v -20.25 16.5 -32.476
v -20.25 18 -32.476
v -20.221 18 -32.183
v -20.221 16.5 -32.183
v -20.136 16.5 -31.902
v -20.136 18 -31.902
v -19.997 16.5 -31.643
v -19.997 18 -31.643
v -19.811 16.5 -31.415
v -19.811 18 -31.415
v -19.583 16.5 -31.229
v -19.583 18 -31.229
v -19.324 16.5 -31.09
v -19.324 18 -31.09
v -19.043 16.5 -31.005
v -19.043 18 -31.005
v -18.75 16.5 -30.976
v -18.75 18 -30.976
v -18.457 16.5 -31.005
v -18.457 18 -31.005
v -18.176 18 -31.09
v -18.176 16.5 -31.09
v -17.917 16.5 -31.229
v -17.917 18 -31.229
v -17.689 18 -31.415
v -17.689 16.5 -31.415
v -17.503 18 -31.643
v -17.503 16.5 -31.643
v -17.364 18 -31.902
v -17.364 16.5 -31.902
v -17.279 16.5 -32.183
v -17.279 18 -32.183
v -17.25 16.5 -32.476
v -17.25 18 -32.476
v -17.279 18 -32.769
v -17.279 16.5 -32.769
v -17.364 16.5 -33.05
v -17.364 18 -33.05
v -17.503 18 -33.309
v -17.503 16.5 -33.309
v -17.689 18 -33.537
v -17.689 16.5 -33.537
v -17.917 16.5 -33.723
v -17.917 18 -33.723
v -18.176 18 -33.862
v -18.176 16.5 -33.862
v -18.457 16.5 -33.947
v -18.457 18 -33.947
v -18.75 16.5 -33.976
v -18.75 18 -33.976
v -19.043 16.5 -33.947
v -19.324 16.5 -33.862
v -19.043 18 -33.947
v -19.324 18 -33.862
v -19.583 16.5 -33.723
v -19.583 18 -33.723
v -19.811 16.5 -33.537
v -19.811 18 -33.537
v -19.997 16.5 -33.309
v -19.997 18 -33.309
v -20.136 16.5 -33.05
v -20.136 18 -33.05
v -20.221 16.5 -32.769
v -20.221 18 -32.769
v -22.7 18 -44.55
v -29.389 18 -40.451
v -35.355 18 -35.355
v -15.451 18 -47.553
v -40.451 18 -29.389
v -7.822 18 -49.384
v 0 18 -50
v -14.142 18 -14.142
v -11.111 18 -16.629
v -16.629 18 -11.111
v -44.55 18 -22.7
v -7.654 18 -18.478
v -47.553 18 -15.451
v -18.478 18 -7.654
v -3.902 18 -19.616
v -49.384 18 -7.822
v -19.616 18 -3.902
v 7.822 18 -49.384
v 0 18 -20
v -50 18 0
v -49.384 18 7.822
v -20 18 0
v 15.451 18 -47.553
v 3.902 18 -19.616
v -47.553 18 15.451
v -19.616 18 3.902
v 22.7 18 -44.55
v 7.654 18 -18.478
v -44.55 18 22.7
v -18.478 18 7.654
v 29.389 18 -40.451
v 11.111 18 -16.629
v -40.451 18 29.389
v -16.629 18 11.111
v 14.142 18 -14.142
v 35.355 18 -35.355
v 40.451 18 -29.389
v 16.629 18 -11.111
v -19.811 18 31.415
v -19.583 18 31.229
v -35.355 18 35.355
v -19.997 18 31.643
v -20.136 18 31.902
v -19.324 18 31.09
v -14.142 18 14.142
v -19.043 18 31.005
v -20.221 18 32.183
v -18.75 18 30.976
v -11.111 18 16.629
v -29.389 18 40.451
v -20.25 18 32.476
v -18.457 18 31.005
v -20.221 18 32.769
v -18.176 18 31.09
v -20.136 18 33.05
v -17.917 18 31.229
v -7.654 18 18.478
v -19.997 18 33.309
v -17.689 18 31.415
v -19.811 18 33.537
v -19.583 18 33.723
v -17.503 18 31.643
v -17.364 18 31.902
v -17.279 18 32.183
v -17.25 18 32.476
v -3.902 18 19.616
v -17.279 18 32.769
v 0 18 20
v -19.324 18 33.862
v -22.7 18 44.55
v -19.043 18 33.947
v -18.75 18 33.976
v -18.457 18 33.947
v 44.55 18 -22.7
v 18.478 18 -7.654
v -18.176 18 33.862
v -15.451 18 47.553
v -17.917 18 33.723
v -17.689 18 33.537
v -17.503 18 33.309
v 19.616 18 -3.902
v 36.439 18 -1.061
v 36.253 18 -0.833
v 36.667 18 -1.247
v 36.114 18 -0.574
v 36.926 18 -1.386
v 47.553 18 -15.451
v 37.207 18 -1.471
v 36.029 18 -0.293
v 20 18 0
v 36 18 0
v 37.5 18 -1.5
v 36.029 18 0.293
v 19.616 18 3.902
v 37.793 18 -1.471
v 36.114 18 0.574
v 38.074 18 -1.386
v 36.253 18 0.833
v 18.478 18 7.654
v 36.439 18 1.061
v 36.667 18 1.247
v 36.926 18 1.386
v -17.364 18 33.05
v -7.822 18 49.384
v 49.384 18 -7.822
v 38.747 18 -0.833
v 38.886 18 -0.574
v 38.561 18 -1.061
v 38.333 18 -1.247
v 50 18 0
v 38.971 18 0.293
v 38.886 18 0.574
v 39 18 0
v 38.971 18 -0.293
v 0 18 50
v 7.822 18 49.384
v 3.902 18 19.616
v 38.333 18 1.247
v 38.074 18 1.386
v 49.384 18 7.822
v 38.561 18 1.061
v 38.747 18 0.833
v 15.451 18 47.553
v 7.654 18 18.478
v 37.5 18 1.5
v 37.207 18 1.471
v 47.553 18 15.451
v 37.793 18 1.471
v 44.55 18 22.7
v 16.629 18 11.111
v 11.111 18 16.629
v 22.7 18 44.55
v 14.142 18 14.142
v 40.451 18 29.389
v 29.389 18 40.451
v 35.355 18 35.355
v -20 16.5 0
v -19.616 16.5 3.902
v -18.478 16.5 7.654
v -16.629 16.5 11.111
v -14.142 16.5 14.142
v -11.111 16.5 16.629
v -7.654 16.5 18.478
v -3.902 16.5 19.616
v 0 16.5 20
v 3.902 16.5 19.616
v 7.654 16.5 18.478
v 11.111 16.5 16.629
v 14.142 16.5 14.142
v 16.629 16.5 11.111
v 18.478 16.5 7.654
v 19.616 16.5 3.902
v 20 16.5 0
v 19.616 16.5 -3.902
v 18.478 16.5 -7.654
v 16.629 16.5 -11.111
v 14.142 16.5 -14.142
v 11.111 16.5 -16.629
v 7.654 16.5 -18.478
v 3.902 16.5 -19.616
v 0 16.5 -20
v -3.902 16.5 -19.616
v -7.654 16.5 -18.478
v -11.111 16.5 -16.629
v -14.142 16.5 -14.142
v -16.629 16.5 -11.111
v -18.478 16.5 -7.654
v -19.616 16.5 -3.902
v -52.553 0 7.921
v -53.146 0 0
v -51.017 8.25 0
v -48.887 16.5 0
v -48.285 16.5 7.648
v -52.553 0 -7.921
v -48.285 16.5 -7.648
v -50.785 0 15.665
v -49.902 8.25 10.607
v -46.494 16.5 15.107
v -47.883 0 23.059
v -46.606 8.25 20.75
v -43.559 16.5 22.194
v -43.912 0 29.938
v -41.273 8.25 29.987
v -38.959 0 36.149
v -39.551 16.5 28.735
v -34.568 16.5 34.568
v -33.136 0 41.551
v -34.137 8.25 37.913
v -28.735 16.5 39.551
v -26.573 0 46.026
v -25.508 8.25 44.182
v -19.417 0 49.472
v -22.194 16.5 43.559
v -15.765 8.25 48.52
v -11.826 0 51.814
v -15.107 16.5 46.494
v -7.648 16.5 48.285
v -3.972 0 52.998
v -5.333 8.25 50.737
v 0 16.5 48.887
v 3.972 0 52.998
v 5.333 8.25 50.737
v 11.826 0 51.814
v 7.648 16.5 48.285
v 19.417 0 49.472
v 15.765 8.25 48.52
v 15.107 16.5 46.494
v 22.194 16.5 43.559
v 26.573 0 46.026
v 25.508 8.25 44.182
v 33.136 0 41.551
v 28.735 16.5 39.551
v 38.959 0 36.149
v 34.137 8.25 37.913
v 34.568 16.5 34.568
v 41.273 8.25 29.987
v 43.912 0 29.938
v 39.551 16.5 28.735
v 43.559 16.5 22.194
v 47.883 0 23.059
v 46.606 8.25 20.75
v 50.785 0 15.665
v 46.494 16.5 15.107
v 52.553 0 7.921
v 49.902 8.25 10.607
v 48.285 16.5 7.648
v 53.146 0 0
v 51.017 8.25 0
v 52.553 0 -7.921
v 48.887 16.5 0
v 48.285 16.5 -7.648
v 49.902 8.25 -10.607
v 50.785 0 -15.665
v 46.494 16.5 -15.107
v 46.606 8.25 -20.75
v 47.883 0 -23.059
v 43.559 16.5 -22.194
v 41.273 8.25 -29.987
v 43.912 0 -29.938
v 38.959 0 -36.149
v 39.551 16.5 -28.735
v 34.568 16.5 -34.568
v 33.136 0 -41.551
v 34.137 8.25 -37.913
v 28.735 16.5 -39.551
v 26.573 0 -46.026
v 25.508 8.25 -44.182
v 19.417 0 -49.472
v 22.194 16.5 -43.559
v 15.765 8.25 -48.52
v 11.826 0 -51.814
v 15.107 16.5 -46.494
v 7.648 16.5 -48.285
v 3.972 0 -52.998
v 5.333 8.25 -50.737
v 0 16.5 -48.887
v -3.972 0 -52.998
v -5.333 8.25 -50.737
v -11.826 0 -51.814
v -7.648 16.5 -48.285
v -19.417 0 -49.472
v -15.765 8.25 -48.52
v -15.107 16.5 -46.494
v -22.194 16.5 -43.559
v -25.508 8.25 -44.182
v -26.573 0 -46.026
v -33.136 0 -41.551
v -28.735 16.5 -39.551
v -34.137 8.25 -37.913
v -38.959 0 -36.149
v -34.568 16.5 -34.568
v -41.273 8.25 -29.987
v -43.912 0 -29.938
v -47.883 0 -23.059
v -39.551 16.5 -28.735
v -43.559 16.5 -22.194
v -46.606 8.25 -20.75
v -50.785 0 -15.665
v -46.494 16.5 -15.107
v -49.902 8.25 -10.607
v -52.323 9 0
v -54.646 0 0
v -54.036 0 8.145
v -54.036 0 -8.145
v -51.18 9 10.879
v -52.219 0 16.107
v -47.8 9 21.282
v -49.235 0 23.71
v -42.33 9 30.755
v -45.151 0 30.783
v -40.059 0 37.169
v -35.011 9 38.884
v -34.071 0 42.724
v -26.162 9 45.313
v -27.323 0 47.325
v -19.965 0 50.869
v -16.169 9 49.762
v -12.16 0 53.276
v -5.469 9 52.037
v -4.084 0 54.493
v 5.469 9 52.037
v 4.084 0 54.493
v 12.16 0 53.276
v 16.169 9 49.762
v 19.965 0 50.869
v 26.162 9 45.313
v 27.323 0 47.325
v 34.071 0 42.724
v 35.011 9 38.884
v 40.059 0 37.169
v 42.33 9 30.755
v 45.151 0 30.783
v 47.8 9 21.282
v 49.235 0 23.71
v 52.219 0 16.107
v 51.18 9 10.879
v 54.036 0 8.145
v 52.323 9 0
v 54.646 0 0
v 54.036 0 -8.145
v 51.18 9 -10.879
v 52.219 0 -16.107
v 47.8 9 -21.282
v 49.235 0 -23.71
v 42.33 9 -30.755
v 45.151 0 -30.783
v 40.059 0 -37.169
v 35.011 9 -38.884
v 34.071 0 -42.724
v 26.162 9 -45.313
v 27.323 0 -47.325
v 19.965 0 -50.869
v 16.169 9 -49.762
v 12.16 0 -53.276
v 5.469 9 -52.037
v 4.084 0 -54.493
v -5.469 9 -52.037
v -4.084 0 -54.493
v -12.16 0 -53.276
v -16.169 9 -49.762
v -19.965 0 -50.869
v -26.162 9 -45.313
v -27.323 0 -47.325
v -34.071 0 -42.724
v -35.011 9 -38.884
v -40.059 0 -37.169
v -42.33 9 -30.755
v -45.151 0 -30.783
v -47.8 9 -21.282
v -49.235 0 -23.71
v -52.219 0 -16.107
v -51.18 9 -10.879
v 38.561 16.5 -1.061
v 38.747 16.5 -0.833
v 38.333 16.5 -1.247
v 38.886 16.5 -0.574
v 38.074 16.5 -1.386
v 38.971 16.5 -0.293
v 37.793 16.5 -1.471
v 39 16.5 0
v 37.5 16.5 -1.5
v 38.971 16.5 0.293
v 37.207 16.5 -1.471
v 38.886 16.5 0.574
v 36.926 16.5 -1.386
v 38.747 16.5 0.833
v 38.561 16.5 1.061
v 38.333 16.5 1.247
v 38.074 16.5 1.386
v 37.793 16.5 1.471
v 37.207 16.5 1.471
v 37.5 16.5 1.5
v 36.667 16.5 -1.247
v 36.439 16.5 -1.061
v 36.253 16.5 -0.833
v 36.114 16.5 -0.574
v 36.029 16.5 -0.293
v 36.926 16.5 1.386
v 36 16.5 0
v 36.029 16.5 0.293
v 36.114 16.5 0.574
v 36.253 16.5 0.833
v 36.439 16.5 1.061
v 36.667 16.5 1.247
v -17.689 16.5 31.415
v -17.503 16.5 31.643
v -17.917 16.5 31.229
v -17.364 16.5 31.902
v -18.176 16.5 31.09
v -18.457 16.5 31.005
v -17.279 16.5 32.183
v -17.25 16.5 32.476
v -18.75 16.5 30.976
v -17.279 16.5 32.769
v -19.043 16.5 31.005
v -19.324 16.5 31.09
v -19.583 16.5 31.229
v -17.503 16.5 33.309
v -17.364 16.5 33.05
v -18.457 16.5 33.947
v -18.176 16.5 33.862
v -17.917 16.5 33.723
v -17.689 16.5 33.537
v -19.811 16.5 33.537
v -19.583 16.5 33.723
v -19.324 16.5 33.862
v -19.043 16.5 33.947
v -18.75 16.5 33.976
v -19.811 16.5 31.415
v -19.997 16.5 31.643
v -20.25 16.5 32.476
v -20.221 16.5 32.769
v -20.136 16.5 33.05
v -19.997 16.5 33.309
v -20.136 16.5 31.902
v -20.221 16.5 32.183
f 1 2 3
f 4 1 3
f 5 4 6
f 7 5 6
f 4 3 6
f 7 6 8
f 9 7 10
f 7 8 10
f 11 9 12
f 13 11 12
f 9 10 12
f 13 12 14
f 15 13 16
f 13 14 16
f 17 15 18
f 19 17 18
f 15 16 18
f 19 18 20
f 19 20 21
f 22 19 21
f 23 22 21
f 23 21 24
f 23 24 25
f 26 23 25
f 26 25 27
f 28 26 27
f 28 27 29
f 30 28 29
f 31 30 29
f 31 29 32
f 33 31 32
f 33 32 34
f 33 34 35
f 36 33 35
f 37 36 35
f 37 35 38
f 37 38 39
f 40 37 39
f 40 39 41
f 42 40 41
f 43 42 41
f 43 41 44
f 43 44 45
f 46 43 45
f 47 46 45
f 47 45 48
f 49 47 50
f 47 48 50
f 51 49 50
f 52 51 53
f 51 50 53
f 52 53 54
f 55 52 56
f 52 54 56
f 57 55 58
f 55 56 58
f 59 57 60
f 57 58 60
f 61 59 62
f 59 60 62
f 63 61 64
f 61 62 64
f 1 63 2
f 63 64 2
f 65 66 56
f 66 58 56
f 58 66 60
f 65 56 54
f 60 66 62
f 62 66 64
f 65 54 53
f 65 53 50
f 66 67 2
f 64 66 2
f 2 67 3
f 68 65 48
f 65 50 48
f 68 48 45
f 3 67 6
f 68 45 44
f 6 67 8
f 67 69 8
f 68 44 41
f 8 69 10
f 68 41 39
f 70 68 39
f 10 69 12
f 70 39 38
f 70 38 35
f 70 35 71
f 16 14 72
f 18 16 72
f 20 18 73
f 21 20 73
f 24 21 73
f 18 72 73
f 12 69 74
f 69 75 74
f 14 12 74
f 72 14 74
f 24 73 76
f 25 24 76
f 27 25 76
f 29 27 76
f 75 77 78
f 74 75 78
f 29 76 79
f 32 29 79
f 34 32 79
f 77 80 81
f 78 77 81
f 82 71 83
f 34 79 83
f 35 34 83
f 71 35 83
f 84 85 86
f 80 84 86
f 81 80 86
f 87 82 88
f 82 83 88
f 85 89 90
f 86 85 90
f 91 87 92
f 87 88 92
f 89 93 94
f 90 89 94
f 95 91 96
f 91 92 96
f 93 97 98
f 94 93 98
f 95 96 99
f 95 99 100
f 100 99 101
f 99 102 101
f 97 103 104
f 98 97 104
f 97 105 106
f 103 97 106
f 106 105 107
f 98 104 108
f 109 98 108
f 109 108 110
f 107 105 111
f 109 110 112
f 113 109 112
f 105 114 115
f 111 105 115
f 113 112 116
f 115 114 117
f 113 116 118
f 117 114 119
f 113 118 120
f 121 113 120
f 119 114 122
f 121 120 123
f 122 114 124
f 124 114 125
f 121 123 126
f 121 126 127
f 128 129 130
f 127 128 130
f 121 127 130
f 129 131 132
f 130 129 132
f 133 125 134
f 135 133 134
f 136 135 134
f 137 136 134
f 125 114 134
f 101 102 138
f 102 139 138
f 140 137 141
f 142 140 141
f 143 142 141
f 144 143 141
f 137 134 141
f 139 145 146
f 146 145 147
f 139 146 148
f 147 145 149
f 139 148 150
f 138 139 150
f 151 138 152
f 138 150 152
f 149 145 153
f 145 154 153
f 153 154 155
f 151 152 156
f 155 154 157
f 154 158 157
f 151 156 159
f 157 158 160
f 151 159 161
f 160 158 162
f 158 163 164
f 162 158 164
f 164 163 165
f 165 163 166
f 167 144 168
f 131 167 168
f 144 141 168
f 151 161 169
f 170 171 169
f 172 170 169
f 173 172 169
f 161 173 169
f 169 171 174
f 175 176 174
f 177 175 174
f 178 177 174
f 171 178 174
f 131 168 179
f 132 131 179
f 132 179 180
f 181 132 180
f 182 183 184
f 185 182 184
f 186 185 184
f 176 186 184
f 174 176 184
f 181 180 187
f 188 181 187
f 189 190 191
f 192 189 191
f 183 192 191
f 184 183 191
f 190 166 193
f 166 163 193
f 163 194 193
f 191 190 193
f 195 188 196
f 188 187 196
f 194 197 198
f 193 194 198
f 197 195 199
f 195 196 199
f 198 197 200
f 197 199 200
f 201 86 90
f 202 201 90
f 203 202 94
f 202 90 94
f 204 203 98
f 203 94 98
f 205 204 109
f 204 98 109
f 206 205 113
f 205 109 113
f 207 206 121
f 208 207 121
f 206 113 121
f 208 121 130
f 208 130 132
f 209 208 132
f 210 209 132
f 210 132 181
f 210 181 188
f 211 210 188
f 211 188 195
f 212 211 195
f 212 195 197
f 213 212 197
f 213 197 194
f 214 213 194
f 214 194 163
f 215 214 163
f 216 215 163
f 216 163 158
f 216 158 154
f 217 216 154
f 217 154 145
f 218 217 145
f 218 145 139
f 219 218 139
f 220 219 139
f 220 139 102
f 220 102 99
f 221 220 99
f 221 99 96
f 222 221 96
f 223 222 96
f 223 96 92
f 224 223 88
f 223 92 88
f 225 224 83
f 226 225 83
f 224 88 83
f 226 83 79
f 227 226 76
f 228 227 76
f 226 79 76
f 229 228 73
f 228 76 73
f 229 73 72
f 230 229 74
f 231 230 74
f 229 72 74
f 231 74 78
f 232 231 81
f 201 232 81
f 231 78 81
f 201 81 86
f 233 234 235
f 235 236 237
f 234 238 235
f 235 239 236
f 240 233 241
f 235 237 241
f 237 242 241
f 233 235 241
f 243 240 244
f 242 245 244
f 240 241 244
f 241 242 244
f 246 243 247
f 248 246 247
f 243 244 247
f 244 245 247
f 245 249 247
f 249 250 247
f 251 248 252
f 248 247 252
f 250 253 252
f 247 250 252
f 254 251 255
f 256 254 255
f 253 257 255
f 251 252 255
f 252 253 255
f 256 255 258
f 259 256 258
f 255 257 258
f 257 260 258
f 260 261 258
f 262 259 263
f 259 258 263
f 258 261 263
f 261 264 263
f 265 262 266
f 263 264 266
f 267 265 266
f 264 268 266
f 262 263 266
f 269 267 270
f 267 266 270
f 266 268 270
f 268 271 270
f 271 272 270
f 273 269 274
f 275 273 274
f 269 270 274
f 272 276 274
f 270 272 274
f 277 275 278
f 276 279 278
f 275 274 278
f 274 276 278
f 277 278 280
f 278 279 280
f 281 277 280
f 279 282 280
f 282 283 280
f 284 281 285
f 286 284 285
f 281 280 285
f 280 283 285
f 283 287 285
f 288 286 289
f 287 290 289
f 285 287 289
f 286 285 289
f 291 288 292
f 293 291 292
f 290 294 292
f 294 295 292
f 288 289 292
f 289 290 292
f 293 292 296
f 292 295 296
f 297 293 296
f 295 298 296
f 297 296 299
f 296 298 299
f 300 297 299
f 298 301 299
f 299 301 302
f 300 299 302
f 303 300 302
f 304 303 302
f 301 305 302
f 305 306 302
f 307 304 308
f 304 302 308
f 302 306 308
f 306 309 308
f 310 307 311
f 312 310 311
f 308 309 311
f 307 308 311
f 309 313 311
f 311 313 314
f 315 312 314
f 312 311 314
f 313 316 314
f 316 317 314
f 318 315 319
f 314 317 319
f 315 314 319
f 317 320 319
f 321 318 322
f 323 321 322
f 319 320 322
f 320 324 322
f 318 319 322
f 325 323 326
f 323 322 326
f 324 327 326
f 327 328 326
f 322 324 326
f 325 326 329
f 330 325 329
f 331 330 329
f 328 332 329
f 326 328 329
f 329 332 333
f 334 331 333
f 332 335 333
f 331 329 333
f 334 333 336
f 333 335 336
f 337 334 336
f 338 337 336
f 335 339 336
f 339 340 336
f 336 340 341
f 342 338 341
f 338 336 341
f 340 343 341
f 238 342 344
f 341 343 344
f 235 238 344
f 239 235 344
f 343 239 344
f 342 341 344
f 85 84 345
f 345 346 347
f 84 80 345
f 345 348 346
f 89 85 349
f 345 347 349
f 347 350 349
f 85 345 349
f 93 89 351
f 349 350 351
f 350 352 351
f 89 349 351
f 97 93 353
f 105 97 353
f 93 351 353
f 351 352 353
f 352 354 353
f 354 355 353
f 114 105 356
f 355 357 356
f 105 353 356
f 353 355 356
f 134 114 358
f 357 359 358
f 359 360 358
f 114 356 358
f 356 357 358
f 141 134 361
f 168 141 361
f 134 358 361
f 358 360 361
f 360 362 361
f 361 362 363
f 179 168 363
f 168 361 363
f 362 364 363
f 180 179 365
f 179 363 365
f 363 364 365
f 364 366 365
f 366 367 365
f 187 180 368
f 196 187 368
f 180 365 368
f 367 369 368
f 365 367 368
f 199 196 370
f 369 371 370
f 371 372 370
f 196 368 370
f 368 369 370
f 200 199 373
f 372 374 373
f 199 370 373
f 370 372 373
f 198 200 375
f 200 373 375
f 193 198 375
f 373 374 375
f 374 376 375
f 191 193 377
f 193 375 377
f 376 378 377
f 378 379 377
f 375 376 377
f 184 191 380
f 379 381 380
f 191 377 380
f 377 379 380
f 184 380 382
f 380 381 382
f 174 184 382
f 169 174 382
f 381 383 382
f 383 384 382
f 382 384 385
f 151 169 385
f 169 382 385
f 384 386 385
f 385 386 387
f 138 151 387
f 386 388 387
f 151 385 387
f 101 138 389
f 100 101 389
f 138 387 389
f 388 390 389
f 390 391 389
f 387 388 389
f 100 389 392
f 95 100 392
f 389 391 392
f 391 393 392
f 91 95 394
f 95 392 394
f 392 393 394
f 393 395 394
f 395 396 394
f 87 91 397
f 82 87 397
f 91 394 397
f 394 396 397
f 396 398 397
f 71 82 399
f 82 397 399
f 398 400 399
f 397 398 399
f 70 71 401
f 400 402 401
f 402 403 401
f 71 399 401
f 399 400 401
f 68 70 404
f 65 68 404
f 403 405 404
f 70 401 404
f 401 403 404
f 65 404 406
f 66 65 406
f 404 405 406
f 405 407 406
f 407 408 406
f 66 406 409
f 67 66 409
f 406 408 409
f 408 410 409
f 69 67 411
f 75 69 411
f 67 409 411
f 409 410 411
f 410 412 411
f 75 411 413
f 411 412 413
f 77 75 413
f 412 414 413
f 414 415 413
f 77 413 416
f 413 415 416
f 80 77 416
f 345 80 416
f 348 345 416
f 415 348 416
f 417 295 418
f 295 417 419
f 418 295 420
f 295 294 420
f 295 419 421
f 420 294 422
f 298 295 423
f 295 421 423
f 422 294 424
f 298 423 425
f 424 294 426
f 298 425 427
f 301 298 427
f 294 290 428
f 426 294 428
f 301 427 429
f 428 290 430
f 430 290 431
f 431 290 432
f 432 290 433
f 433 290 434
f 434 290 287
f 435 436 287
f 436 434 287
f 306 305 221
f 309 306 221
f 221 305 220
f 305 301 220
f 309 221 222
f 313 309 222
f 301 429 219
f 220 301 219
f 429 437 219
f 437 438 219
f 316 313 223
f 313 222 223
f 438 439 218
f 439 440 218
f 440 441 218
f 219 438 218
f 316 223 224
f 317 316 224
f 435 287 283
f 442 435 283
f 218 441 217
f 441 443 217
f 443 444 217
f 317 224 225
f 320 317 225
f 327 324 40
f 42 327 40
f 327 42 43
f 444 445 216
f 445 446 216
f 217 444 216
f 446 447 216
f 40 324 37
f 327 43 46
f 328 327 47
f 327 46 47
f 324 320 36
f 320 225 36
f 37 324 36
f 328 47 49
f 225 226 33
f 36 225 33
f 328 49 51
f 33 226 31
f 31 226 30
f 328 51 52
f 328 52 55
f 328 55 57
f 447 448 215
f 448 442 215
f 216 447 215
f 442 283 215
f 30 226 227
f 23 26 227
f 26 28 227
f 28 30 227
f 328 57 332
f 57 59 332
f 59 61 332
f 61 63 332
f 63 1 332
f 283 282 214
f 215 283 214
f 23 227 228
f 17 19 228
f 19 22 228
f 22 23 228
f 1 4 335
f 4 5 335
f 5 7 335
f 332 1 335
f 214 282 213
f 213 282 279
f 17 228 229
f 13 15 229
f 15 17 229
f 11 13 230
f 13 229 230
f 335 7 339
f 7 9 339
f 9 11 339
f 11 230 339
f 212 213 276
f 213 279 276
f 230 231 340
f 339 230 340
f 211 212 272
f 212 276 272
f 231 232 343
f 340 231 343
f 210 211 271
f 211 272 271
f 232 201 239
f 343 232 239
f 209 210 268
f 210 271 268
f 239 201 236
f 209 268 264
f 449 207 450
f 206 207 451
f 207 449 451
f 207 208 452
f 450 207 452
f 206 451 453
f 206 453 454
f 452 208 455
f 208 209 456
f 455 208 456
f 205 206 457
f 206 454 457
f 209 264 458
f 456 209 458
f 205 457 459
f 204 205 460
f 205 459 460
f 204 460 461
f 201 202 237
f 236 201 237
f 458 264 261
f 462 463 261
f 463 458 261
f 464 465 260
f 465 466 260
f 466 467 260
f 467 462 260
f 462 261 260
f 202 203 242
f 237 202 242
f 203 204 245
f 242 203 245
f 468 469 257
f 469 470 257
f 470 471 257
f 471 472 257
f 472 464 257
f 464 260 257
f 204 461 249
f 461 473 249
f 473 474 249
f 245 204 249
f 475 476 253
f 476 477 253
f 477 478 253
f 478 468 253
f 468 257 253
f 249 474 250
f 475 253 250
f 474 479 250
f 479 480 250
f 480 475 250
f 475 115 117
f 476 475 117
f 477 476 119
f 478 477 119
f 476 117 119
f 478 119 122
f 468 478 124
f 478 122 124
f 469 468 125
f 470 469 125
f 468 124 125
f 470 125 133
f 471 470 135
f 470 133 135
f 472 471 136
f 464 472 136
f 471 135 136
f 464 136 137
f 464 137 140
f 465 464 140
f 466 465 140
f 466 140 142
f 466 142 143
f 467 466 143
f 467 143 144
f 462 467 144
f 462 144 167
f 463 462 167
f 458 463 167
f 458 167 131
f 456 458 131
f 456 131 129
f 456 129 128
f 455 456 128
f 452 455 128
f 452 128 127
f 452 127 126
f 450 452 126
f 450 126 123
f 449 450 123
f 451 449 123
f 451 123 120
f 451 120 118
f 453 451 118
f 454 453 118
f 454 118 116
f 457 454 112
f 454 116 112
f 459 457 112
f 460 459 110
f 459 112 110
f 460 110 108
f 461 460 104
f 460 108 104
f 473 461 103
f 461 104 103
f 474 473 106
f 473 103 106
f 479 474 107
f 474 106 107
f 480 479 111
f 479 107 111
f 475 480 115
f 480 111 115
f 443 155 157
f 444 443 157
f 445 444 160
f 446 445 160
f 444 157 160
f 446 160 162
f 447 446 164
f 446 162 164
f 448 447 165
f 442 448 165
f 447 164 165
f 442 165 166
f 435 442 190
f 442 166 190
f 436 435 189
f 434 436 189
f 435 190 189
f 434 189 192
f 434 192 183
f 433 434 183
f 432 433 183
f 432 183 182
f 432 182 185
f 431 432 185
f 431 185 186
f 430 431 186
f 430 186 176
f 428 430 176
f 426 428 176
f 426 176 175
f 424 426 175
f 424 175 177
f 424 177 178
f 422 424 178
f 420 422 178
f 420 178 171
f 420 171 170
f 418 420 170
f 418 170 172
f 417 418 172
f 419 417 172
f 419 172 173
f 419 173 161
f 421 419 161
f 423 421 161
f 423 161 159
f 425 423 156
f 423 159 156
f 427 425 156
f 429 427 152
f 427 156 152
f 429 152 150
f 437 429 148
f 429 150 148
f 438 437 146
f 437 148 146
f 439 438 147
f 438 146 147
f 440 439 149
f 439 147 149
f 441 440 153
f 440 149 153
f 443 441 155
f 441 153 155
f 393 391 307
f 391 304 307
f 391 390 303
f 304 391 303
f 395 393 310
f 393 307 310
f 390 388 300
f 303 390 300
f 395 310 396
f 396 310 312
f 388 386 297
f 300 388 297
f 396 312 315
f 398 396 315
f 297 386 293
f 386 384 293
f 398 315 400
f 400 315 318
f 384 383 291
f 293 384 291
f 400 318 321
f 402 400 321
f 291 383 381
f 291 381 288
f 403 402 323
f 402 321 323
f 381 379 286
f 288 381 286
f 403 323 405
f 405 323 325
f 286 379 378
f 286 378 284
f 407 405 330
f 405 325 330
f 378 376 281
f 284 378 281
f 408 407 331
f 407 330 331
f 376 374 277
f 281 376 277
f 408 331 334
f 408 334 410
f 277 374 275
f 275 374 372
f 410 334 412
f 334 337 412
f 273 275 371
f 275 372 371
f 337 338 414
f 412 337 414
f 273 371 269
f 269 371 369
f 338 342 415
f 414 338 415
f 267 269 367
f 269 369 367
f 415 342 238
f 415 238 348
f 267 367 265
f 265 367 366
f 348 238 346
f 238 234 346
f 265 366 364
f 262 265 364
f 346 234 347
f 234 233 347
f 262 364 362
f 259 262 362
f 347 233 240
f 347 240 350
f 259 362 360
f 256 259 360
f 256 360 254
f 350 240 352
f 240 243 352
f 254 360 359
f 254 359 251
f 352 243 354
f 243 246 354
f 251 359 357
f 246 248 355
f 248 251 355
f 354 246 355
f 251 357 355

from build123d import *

# Parameters (mm, degrees)
SKETCH001_R     = 1.5
HOLE_DEPTH      = 25
COPYSKETCH002_R = 20
POCKET_DEPTH    = 5


with BuildPart() as part:
    # Sketch → Revolution (revolve)
    with BuildSketch(Plane.XY):
        Polygon((-54.6463, 0), (-53.1463, 0), (-48.887192, 16.5), (0, 16.5), (0, 18), (-50, 18), align=None)
    revolve(axis=Axis((0, 0, 0), (0, 1, 0)))

    # Sketch001 (on Face4 of Revolution) → Hole (cut)
    with BuildSketch(Plane(origin=(0, 18, 0), x_dir=(-1, 0, 0), z_dir=(0, 1, 0))):
        with Locations((-37.5, 0)):
            Circle(SKETCH001_R)
        with Locations((18.75, 32.475953)):
            Circle(SKETCH001_R)
        with Locations((18.75, -32.475953)):
            Circle(SKETCH001_R)
        Circle(SKETCH001_R)
    extrude(amount=-HOLE_DEPTH, mode=Mode.SUBTRACT)

    # CopySketch002 → Pocket (cut)
    with BuildSketch(Plane(origin=(0, 18, 0), x_dir=(-1, 0, 0), z_dir=(0, 1, 0))):
        Circle(COPYSKETCH002_R)
    extrude(amount=-POCKET_DEPTH, mode=Mode.SUBTRACT)


solid = part.part
